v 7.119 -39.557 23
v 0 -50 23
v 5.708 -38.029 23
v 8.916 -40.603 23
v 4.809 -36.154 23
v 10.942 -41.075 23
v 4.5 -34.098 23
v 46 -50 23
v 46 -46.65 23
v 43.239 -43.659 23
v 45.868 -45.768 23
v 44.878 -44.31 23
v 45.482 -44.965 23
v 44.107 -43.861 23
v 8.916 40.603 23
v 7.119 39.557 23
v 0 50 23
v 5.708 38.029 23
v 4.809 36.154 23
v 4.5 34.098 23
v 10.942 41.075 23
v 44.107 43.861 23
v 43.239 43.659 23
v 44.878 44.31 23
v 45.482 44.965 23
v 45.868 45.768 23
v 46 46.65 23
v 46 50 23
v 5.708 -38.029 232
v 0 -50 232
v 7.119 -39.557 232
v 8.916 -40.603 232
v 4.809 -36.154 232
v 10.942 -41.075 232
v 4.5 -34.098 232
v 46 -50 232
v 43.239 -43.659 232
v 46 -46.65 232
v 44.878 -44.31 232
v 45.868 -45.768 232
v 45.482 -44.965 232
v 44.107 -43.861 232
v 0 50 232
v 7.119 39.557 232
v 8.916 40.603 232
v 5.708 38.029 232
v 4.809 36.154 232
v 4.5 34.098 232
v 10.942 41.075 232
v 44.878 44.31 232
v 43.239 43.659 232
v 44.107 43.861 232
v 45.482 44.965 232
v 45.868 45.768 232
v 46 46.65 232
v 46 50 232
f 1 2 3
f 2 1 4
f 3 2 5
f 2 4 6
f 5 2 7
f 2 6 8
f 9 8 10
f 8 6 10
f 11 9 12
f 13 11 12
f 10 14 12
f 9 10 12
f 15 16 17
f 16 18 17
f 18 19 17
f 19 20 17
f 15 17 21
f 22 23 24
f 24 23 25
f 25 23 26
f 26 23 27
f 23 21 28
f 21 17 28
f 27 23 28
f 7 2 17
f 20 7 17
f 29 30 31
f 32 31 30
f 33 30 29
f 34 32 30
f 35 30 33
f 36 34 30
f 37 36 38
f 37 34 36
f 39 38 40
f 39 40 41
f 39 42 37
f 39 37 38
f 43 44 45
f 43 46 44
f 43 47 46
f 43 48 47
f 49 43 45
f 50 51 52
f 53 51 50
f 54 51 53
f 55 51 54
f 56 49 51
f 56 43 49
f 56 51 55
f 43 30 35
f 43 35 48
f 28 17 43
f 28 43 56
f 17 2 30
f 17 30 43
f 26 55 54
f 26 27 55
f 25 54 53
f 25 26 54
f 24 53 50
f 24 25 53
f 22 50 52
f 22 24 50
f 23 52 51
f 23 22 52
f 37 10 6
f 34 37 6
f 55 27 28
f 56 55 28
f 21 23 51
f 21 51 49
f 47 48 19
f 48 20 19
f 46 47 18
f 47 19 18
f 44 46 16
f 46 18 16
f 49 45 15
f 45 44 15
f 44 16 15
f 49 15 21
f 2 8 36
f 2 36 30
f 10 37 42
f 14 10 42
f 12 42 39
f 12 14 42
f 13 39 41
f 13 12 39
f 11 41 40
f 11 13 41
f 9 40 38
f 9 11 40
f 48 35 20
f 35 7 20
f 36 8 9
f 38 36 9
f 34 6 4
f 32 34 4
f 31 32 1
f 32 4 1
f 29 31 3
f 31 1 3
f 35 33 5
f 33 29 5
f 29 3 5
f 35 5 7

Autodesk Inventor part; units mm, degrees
ref_plane "Начальная плоскость" through (0, 0, 23) normal (0, 0, 1) x (1, 0, 0)
ref_plane "Конечная плоскость" through (0, 0, 232) normal (0, 0, 1) x (1, 0, 0)
sketch "Эскиз" plane through (0, 0, 0) normal (0, 0, 1) x (1, 0, 0)
  line L0 (46, -50) -> (0, -50)
  line L1 (46, -50) -> (46, -46.6496)
  line L2 (43.2392, -43.6591) -> (10.9418, -41.0753)
  line L3 (4.5, -34.0976) -> (4.5, 34.0976)
  line L4 (43.2392, 43.6591) -> (10.9418, 41.0753)
  line L5 (46, 46.6496) -> (46, 50)
  line L6 (0, 50) -> (46, 50)
  line L7 (0, -50) -> (0, 50)
  arc A0 (4.5, -34.0976) -> (10.9418, -41.0753) centre (11.5, -34.0976) ccw
  arc A1 (10.9418, 41.0753) -> (4.5, 34.0976) centre (11.5, 34.0976) ccw
  arc A2 (46, -46.6496) -> (43.2392, -43.6591) centre (43, -46.6496) ccw
  arc A3 (43.2392, 43.6591) -> (46, 46.6496) centre (43, 46.6496) ccw
  line L8 (0, 70) -> (0, -70) construction
  line L9 (-9.3169, 0) -> (55.9016, 0) construction
  point P0 (46, -43.88)
  point P1 (4.5, -40.56)
  point P2 (4.5, 40.56)
  point P3 (46, 43.88)
  dimension "d3" = 46
  dimension "d5" = 4.5
  dimension "d7" = 100
  dimension "d9" = 9.44
  dimension "d11" = 9.44
  dimension "d13" = 6.12
  dimension "d15" = 6.12
  dimension "d22" = 7
  dimension "d23" = 3
  dimension "d24" = 50
  dimension "d25" = 0
extrude "Тело" add sketch "Эскиз" along normal up to surface (209 mm away) from surface at 23
sketch "Sketch3" plane through (0, 0, 0) normal (0, 0, 1) x (1, 0, 0)
  line L0 (0, 0) -> (10, 0)
ref_plane "Work Plane7" through (0, 0, 0) normal (0, -1, 0) x (1, 0, 0)
sketch "Sketch4" plane through (0, 0, 0) normal (0, -1, 0) x (1, 0, 0)
  line L0 (-2, 23) -> (12, 23)
  line L1 (-2, 232) -> (12, 232)
  dimension "d29" = 209
ref_plane "РабПлоскость8" through (-82, -50, 23) normal (0, 0, -1) x (-1, 0, 0)
split "Разделение1" plane through (-82, -50, 23) removes the side toward (0, 0, -1)
ref_plane "РабПлоскость9" through (533, -50, 232) normal (0, 0, 1) x (1, 0, 0)
split "Разделение2" plane through (533, -50, 232) removes the side toward (0, 0, 1)
equation "\"d3\" = b"
equation "\"d5\" = t1"
equation "\"d7\" = ParH"
equation "\"d9\" = msp_x1 + t2"
equation "\"d11\" = msp_x1 + t2"
equation "\"d13\" = -msp_x2 + t2"
equation "\"d15\" = -msp_x2 + t2"
equation "\"d22\" = R"
equation "\"d23\" = R1"
equation "\"d24\" = 0.5 * d7"
equation "\"d16\" = G_L"
equation "\"R1\" = 3"
equation "\"R\" = 7"
equation "\"t1\" = 4.5"
equation "\"t2\" = 7.6"
equation "\"ParH\" = 100"
equation "\"b\" = 46"
equation "\"msp_x1\" = 0.04 * b"
equation "\"msp_x2\" = -0.08 * t1 + 0.04 * b"
equation "\"G_L\" = d29"
equation "\"ex\" = 0"
equation "\"G_OFFSET_START\" = -23"
equation "\"G_OFFSET_END\" = -23"
equation "\"d26\" = -G_OFFSET_START"
equation "\"d27\" = G_OFFSET_END + B_L"
equation "\"B_L\" = 255"
properties part number "Швеллер 10U-209 ГОСТ 8240-97" material "Сталь, мягкая, сварочная"
